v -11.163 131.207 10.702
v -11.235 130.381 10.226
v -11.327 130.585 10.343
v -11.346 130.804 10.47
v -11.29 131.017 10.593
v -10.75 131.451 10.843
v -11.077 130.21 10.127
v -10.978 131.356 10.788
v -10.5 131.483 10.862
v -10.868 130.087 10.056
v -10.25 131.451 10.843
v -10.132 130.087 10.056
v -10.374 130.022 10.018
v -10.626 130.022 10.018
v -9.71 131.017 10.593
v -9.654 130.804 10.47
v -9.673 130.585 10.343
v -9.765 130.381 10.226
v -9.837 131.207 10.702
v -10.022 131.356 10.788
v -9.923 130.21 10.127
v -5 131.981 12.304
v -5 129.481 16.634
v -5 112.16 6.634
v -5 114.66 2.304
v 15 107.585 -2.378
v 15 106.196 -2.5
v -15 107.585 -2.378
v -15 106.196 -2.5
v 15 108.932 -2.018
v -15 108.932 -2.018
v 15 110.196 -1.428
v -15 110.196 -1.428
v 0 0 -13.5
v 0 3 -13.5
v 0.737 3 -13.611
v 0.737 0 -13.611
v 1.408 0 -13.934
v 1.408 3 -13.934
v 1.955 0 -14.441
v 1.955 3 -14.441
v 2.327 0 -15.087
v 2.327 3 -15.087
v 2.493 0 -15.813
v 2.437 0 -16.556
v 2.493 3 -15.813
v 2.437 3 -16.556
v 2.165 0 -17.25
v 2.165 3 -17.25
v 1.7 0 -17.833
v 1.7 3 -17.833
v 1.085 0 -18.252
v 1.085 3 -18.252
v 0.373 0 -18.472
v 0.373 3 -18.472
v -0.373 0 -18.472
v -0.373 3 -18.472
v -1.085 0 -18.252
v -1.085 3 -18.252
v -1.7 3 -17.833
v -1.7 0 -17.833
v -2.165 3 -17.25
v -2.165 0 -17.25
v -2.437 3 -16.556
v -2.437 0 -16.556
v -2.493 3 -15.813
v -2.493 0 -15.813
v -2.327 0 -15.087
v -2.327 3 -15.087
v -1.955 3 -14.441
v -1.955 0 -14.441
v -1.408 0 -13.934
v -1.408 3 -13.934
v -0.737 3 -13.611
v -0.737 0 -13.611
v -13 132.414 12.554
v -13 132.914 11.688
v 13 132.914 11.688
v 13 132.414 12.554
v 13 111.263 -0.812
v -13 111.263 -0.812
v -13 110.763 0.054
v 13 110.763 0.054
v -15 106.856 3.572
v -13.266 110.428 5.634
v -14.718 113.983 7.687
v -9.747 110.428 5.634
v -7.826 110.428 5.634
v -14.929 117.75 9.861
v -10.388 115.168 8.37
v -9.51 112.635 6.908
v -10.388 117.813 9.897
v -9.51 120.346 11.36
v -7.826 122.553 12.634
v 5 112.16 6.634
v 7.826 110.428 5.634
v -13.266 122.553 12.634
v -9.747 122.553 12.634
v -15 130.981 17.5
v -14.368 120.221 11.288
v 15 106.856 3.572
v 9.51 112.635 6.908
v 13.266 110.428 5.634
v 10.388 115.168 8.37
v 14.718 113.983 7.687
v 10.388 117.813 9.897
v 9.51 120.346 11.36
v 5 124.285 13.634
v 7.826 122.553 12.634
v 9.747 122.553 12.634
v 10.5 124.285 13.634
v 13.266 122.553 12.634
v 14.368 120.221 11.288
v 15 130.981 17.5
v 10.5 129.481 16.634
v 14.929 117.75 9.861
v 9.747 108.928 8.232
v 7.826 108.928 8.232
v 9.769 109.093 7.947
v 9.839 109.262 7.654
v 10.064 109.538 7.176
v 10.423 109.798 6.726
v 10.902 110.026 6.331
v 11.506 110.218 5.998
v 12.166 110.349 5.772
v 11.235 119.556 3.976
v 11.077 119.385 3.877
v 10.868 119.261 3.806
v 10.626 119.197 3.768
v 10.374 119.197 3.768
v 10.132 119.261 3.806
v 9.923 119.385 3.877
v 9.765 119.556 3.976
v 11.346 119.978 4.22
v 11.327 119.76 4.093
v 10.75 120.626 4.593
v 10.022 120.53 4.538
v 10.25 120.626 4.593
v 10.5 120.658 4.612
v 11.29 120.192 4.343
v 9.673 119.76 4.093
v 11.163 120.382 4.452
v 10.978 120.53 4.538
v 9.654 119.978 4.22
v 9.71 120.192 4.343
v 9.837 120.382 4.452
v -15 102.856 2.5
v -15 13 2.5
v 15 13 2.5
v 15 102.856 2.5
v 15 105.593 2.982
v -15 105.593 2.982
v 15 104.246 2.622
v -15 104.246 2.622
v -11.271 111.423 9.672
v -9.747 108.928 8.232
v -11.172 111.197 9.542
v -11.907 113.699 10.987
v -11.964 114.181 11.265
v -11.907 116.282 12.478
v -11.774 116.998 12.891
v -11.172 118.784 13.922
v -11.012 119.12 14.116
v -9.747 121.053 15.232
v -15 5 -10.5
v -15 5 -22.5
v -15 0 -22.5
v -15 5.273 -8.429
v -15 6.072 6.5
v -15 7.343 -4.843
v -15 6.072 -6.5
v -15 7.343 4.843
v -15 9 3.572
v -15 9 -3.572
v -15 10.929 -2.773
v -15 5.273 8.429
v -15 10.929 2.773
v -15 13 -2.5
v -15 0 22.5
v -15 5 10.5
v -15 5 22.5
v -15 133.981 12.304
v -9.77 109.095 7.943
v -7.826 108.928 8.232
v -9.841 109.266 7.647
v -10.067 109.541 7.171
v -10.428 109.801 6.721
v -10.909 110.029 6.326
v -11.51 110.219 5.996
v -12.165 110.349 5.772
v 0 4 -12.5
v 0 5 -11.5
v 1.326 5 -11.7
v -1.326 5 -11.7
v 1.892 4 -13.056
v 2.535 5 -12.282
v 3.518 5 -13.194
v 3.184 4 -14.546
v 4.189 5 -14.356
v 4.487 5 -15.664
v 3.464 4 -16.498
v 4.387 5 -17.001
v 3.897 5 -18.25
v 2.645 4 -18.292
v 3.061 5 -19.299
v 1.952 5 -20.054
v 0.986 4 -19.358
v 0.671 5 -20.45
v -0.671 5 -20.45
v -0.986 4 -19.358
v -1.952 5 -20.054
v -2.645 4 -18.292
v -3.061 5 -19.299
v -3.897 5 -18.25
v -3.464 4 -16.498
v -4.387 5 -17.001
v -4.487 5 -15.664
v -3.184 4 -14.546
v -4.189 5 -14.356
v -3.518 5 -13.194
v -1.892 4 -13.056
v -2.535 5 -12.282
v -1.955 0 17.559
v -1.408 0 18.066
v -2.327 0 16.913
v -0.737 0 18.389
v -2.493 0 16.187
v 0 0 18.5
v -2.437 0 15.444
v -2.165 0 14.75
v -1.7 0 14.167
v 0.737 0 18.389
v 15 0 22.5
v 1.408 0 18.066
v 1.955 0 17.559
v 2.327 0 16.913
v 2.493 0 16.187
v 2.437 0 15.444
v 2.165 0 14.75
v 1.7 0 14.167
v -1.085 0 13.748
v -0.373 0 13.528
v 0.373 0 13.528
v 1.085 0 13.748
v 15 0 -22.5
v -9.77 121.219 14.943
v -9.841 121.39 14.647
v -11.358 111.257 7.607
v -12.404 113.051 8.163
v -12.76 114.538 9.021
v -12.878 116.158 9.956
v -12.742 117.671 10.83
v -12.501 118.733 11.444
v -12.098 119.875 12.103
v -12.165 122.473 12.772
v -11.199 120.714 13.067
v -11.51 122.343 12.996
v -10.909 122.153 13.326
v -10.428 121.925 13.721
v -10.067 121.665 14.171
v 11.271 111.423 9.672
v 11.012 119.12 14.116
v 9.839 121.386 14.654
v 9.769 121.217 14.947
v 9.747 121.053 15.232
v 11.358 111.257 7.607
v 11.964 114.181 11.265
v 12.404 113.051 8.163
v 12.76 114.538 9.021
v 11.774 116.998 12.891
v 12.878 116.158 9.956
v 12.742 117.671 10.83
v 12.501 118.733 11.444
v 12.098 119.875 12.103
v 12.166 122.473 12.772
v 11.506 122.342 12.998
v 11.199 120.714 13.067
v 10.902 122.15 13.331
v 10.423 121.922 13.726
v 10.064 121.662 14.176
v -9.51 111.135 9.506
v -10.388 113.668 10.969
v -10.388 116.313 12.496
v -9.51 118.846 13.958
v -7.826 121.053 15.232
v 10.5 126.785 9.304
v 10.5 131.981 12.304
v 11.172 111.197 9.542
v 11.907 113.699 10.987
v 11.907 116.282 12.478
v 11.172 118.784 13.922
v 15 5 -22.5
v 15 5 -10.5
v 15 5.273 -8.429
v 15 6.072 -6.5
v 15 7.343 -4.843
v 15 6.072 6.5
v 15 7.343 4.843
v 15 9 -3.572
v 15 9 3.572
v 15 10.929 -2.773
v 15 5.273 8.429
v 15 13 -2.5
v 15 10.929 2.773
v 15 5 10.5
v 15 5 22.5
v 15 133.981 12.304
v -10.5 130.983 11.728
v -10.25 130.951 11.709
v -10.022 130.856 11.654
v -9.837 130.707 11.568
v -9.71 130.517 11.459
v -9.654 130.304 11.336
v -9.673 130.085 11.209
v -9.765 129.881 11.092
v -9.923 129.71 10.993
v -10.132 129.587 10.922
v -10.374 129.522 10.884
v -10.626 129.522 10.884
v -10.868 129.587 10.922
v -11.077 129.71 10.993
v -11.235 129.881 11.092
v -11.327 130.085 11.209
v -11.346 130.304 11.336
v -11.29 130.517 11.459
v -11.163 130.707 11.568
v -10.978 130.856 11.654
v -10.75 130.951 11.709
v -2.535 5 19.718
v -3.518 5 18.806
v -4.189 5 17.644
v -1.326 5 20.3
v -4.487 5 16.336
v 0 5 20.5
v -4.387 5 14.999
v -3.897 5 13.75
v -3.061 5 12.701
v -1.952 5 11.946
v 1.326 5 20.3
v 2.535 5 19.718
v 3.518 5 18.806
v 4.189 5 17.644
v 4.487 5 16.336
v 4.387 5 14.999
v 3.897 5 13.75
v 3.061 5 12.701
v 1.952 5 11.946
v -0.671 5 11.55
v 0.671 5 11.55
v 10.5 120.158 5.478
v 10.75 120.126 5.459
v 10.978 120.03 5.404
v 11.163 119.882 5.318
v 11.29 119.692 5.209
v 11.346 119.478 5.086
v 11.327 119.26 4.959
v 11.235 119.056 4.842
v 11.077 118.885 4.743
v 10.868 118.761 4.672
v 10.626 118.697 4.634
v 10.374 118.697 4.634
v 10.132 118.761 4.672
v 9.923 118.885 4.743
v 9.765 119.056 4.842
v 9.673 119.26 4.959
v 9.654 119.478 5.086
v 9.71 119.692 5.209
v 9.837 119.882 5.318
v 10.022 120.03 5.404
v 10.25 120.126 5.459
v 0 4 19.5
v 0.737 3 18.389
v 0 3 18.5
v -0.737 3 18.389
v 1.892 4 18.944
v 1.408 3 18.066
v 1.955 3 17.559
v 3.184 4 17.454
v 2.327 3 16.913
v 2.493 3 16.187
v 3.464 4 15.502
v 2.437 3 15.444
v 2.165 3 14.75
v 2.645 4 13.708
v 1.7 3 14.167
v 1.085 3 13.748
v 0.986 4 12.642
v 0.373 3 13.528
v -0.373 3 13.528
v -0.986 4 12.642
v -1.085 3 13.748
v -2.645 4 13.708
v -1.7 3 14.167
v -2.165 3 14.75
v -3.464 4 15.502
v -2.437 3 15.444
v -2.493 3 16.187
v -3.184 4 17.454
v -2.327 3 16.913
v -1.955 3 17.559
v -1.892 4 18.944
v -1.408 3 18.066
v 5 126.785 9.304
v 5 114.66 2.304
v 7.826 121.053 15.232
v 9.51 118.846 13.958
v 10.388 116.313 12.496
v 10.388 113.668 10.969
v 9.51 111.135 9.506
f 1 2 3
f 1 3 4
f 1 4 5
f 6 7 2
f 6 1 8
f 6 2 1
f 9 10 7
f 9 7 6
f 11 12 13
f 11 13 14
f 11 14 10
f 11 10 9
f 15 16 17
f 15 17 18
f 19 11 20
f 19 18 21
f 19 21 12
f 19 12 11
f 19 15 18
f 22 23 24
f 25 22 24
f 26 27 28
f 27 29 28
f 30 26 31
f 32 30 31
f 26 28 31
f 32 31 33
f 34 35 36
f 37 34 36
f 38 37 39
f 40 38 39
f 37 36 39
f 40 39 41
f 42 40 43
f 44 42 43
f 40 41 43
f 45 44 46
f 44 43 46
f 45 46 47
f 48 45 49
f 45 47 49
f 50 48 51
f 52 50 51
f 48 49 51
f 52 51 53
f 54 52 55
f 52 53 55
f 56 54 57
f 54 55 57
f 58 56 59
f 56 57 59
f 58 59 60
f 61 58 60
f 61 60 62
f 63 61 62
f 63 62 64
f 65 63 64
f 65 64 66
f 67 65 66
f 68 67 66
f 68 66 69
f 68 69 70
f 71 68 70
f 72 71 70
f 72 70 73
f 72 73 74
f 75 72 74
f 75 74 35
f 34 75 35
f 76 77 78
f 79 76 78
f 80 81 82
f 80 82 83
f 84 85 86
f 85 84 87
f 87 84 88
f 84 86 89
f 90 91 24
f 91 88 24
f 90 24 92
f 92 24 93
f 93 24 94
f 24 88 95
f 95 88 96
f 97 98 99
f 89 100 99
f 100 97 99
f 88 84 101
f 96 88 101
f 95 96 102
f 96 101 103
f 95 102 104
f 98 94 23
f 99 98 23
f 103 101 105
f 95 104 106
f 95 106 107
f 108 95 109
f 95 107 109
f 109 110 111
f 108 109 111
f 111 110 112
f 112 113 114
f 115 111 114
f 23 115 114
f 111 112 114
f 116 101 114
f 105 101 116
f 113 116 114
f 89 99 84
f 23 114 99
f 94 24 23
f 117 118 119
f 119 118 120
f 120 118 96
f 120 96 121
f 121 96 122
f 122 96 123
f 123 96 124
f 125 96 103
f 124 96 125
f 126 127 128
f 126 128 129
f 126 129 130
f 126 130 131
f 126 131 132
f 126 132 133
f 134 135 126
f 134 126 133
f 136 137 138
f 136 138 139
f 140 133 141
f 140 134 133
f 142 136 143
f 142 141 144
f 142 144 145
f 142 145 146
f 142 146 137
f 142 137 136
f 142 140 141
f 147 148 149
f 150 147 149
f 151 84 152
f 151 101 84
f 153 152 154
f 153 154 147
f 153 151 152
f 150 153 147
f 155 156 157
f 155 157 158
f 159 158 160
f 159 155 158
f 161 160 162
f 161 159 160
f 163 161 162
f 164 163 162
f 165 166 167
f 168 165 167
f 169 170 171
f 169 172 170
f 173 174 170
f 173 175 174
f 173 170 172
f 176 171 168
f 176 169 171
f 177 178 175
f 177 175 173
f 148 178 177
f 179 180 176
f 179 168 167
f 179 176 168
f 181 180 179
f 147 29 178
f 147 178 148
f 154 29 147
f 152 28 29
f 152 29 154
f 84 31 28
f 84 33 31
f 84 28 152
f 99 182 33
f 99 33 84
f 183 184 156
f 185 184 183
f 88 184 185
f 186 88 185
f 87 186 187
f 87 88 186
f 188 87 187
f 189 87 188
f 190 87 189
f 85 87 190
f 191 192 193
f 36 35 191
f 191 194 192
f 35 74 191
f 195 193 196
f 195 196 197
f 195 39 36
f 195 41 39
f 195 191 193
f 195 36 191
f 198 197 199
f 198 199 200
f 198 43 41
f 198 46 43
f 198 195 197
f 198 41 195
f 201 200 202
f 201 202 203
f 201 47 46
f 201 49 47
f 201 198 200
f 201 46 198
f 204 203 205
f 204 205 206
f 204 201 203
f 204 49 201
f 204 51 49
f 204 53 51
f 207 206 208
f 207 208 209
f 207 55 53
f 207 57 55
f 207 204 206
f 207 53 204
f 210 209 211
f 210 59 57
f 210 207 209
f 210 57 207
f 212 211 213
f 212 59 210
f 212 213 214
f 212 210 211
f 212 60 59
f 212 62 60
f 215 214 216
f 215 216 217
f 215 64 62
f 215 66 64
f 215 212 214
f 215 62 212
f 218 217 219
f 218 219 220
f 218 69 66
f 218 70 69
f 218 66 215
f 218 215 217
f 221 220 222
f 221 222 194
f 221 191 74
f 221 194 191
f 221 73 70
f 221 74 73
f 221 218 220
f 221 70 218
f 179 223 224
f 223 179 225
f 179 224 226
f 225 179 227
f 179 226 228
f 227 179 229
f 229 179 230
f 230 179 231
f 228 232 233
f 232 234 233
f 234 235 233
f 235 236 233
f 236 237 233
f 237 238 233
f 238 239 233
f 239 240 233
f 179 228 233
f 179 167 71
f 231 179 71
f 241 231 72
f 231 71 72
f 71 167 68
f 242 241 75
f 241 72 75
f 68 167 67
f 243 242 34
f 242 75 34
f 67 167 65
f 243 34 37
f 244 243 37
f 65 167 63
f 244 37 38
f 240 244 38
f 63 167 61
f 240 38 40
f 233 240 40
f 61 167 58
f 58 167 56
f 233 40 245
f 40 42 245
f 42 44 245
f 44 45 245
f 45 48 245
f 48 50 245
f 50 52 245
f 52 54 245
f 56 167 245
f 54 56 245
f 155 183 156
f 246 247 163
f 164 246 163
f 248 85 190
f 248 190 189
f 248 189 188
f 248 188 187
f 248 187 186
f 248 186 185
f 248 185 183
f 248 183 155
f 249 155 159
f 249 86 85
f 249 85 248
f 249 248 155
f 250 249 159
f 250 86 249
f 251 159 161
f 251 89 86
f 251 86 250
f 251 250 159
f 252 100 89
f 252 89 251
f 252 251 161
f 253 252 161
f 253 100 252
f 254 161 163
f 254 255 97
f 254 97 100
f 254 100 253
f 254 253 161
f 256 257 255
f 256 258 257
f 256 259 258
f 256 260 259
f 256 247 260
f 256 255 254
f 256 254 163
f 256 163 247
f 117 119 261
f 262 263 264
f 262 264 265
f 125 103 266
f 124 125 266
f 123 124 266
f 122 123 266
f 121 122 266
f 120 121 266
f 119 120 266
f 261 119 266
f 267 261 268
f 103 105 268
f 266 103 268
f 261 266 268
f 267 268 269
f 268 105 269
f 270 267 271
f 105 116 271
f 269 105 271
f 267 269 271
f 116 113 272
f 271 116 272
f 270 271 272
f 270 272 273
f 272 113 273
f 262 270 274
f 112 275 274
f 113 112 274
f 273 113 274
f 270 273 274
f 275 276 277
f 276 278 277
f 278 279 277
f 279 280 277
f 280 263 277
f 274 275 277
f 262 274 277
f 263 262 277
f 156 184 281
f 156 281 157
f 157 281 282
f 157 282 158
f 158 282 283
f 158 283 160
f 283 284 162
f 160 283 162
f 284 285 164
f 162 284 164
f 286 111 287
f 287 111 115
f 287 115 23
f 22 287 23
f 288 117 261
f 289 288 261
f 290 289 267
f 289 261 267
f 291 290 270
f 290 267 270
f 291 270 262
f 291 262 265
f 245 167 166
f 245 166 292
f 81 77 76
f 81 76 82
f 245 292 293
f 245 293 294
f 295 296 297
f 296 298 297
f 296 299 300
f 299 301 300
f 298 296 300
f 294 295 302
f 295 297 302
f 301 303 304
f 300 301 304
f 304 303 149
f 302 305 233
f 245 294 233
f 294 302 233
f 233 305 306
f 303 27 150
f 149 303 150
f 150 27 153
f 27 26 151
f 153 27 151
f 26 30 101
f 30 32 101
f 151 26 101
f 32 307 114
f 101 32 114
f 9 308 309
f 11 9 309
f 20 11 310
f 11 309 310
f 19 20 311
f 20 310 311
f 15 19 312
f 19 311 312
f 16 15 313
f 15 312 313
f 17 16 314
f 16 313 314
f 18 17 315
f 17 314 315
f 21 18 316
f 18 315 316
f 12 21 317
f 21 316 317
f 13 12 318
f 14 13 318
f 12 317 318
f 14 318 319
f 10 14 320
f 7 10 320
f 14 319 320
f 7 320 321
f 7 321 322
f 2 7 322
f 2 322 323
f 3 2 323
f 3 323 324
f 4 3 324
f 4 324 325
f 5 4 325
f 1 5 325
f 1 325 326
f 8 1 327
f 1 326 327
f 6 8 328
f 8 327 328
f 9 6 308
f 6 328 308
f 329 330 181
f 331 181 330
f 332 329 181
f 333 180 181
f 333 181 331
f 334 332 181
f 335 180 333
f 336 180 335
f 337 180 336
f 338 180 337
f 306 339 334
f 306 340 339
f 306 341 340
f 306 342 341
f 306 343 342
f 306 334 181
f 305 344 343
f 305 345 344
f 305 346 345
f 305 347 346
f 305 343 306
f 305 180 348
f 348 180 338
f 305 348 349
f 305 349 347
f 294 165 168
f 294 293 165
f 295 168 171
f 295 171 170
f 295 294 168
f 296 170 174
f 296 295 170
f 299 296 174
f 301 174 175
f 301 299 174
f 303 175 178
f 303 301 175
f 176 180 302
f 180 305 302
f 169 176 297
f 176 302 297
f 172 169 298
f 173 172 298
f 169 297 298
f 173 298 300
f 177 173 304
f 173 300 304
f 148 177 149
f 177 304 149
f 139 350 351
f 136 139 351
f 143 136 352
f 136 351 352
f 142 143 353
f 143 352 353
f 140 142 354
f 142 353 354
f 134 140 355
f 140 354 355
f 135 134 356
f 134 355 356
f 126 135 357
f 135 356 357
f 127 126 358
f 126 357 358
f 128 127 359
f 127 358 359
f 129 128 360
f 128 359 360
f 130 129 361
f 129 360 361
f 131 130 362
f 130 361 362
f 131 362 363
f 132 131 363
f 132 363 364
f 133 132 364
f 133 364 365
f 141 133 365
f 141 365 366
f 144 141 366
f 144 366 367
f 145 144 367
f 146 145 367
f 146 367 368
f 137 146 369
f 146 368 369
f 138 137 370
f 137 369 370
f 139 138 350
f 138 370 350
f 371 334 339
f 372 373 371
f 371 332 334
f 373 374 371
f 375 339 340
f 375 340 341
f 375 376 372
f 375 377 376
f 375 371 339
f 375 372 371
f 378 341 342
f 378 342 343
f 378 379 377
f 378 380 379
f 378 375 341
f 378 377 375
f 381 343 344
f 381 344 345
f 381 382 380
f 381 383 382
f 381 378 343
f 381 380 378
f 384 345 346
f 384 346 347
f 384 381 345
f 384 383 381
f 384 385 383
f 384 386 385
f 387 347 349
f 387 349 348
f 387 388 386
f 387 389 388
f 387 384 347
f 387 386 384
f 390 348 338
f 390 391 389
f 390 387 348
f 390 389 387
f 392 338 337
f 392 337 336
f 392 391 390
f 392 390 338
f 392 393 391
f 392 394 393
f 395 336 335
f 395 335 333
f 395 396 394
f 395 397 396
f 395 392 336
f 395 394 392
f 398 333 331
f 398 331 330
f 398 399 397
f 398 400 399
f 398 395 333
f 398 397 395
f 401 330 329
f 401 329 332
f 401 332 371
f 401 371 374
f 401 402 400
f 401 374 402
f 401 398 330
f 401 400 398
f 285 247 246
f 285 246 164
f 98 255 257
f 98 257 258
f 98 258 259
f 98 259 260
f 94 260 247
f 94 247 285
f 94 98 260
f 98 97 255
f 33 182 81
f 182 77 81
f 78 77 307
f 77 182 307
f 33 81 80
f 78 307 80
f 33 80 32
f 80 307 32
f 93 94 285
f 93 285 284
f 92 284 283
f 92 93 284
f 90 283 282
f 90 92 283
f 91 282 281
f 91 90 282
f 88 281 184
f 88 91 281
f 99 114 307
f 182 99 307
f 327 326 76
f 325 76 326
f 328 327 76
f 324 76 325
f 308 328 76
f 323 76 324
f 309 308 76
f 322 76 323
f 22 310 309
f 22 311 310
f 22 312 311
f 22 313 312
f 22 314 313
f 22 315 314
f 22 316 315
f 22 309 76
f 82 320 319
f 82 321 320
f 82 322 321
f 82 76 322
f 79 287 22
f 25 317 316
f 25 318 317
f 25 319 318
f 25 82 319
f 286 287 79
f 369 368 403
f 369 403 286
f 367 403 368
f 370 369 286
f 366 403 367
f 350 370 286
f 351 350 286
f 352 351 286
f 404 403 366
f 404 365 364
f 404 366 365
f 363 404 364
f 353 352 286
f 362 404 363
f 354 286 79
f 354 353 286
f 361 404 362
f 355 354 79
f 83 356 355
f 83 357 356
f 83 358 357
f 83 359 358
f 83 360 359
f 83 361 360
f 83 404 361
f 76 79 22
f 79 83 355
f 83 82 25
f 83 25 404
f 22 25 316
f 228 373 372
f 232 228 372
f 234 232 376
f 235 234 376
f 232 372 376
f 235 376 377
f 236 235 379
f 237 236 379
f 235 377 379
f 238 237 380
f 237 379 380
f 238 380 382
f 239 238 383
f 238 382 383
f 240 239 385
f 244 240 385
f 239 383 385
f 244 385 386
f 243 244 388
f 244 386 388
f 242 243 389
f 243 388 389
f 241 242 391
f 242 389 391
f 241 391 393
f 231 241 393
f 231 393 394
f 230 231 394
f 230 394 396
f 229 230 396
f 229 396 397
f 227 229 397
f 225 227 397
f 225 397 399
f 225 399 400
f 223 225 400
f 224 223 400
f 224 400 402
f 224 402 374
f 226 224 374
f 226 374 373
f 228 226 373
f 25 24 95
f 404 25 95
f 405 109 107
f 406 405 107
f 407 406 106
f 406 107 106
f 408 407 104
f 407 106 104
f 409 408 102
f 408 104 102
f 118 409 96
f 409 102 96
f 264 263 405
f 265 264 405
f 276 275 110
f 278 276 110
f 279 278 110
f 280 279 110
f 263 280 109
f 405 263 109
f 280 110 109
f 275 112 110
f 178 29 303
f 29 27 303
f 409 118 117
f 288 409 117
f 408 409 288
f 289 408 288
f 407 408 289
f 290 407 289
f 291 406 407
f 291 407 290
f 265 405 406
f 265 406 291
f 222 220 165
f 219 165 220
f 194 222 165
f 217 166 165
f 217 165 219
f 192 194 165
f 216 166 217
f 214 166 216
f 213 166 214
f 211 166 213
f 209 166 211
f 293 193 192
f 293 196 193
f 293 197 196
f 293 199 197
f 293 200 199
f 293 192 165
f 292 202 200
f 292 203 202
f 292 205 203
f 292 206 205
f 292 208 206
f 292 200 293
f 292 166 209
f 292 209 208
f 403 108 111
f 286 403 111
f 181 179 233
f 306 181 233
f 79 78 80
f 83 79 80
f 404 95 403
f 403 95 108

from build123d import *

# Parameters (mm, degrees)
SKETCH1_W           = 30
SKETCH1_H           = 45
BOSS_EXTRUDE1_DEPTH = 5
SKETCH2_W           = 30
SKETCH2_H           = 5
BOSS_EXTRUDE2_DEPTH = 100
BOSS_EXTRUDE3_DEPTH = 30
FILLET1_R           = 8
SKETCH4_R           = 2.5
CUT_EXTRUDE1_DEPTH  = 132.785002923
CHAMFER1_SIZE       = 2
SKETCH5_W           = 26
SKETCH5_H           = 25
CUT_EXTRUDE2_DEPTH  = 1
BOSS_EXTRUDE5_DEPTH = 3
CUT_EXTRUDE3_DEPTH  = 129.19281303
SKETCH7_R           = 0.848419625
BOSS_EXTRUDE4_DEPTH = 1
FILLET2_R           = 3


with BuildPart() as part:
    # Sketch1 → Boss-Extrude1 (new body)
    with BuildSketch(Plane(origin=(0, 0, 0), x_dir=(1, 0, 0), z_dir=(0, 1, 0))):
        Rectangle(SKETCH1_W, SKETCH1_H)
    extrude(amount=BOSS_EXTRUDE1_DEPTH)

    # Sketch2 → Boss-Extrude2 (add)
    with BuildSketch(Plane(origin=(0, 5, 0), x_dir=(1, 0, 0), z_dir=(0, 1, 0))):
        Rectangle(SKETCH2_W, SKETCH2_H)
    extrude(amount=BOSS_EXTRUDE2_DEPTH)

    # Sketch3 → Boss-Extrude3 (add)
    with BuildSketch(Plane(origin=(15, 0, 0), x_dir=(0, 0, -1), z_dir=(1, 0, 0))):
        Polygon((-2.5, 105), (-17.5, 130.980762114), (-12.303847577, 133.980762114), (2.5, 108.339745962), (2.5, 105), align=None)
    extrude(amount=-BOSS_EXTRUDE3_DEPTH)

    # Fillet1
    fillet1_edges = [part.edges().sort_by_distance(p)[0] for p in [
        (0, 5, -2.5),
        (0, 5, 2.5),
        (0, 105, 2.5),
        (0, 108.339745962, -2.5),
    ]]
    fillet(fillet1_edges, radius=FILLET1_R)

    # Sketch4 → Cut-Extrude1 (cut, through all)
    with BuildSketch(Plane(origin=(0, 5, 0), x_dir=(1, 0, 0), z_dir=(0, 1, 0))):
        with Locations(Location((0, 16, 0), (0, 0, 270))):
            Circle(SKETCH4_R)
        with Locations(Location((0, -16, 0), (0, 0, 270))):
            Circle(SKETCH4_R)
    extrude(amount=-CUT_EXTRUDE1_DEPTH, mode=Mode.SUBTRACT)

    # Chamfer1
    chamfer1_edges = [part.edges().sort_by_distance(p)[0] for p in [
        (0, 5, -18.5),
        (0, 5, 13.5),
    ]]
    chamfer(chamfer1_edges, length=CHAMFER1_SIZE)

    # Sketch5 → Cut-Extrude2 (cut)
    with BuildSketch(Plane(origin=(0, 28.167468245, -48.787486121), x_dir=(1, 0, 0), z_dir=(0, 0.4999999999999981, -0.8660254037844397))):
        with Locations((0, -108.45061659)):
            Rectangle(SKETCH5_W, SKETCH5_H)
    extrude(amount=-CUT_EXTRUDE2_DEPTH, mode=Mode.SUBTRACT)

    # Sketch8 → Boss-Extrude5 (add)
    with BuildSketch(Plane(origin=(0, 25.167468245, -43.591333699), x_dir=(1, 0, 0), z_dir=(0, -0.49999999999999784, 0.8660254037844399))):
        with BuildLine():
            Line((-9.746794345, 112.45061659), (-7.826237921, 112.45061659))
            ThreePointArc((-7.826237921, 112.45061659), (-10.5, 105.45061659), (-7.826237921, 98.45061659))
            Line((-7.826237921, 98.45061659), (-9.746794345, 98.45061659))
            ThreePointArc((-9.746794345, 98.45061659), (-12, 105.45061659), (-9.746794345, 112.45061659))
        make_face()
        with BuildLine():
            Line((7.826237921, 98.45061659), (9.746794345, 98.45061659))
            ThreePointArc((9.746794345, 98.45061659), (12, 105.45061659), (9.746794345, 112.45061659))
            Line((9.746794345, 112.45061659), (7.826237921, 112.45061659))
            ThreePointArc((7.826237921, 112.45061659), (10.5, 105.45061659), (7.826237921, 98.45061659))
        make_face()
    extrude(amount=BOSS_EXTRUDE5_DEPTH)

    # Sketch6 → Cut-Extrude3 (cut, through all)
    with BuildSketch(Plane(origin=(0, 25.167468245, -43.591333699), x_dir=(1, 0, 0), z_dir=(0, -0.49999999999999784, 0.8660254037844399))):
        Polygon((-5, 100.45061659), (5, 100.45061659), (5, 114.45061659), (10.5, 114.45061659), (10.5, 120.45061659), (-5, 120.45061659), align=None)
    extrude(amount=-CUT_EXTRUDE3_DEPTH, mode=Mode.SUBTRACT)

    # Sketch7 → Boss-Extrude4 (add)
    with BuildSketch(Plane(origin=(0, 27.667468245, -47.921460718), x_dir=(1, 0, 0), z_dir=(0, 0.4999999999999983, -0.8660254037844397))):
        with Locations(Location((10.5, -105.95061659, 0), (0, 0, 270))):
            Circle(SKETCH7_R)
        with Locations(Location((-10.5, -118.45061659, 0), (0, 0, 270))):
            Circle(SKETCH7_R)
    extrude(amount=BOSS_EXTRUDE4_DEPTH)

    # Fillet2
    fillet2_edges = [part.edges().sort_by_distance(p)[0] for p in [
        (12, 116.490381057, 9.133974596),
        (-12, 116.490381057, 9.133974596),
    ]]
    fillet(fillet2_edges, radius=FILLET2_R - 0.0001)  # a hair under: the kernel refuses the full size


solid = part.part
